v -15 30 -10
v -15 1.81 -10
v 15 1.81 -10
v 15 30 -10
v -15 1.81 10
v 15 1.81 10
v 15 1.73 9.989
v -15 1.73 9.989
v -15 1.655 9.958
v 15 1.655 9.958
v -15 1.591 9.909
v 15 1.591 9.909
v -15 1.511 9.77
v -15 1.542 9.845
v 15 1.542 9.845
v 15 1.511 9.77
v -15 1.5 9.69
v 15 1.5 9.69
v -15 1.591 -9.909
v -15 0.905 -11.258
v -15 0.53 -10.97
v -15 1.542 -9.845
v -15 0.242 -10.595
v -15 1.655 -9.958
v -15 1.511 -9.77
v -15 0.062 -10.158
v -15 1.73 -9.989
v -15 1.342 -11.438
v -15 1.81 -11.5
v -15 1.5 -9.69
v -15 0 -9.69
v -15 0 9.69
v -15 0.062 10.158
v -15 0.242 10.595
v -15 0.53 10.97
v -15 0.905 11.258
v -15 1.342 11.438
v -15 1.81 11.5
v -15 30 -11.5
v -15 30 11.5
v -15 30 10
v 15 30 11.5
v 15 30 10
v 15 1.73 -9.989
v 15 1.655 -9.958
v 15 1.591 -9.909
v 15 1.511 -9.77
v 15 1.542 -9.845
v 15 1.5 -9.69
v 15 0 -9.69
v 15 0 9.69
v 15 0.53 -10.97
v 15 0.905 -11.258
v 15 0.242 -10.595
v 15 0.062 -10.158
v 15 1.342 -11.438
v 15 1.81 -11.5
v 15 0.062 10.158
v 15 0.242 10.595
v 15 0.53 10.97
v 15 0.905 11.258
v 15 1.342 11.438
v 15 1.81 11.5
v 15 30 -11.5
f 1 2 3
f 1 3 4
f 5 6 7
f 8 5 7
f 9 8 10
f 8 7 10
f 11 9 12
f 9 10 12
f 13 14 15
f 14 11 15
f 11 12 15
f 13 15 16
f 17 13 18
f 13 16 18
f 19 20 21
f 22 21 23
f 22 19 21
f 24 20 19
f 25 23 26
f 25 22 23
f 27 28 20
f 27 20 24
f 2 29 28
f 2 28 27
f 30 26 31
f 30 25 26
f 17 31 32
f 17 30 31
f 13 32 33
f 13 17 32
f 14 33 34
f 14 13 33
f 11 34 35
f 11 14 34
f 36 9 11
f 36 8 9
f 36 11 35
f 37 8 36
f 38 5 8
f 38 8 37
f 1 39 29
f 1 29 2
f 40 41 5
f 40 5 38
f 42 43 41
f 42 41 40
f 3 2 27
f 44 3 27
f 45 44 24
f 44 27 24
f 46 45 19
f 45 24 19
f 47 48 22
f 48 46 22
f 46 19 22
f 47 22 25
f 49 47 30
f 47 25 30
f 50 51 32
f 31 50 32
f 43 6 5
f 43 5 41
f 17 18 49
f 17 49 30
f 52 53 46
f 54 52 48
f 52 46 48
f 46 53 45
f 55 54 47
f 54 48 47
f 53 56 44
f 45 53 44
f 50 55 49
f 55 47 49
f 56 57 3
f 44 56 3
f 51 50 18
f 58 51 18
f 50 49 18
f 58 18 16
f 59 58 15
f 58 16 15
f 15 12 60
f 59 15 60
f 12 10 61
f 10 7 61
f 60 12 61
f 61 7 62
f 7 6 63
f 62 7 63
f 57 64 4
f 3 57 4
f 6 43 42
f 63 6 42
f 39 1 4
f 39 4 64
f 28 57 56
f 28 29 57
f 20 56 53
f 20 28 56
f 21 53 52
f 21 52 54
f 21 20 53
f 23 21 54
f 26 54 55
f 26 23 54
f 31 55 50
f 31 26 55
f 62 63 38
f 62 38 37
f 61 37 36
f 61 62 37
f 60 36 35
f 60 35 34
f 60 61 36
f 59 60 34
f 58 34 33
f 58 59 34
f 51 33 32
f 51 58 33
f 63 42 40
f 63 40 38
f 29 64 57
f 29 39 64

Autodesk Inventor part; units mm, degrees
ref_plane "YZ Plane" through (0, 0, 0) normal (1, 0, 0) x (0, 1, 0)
ref_plane "XZ Plane" through (0, 0, 0) normal (0, 1, 0) x (-1, 0, 0)
ref_plane "XY Plane" through (0, 0, 0) normal (0, 0, 1) x (1, 0, 0)
sketch "Sketch1" plane through (0, 0, 0) normal (0, 1, 0) x (-1, 0, 0)
  line L0 (-15, 10) -> (15, 10)
  line L1 (15, 10) -> (15, -10)
  line L2 (15, -10) -> (-15, -10)
  line L3 (-15, -10) -> (-15, 10)
  line L4 (-15, 10) -> (15, -10) construction
  line L5 (15, 10) -> (-15, -10) construction
  point P0 (0, 0)
  dimension "d0" = 20
  dimension "d1" = 30
extrude "Plate1" add sketch "Sketch1" along normal blind 1.5
sketch "Sketch2" plane through (-15, 0, -11.5) normal (0, 0, 1) x (1, 0, 0)
  line L0 (30, 0) -> (0, 0)
  line L1 (0, 0) -> (0, 30)
  line L2 (0, 30) -> (30, 30)
  line L3 (30, 30) -> (30, 0)
edge flange "Flange1" height 30 angle 90 thickness 1.5 bend radius 0.31 thickness toward (0, 0, 1) relief tear relief width 1.5 relief depth 0.75 corner gap 0.31 corner form 0 edges at (0, 1.5, -10) (0, 1.5, 10) wall of the first edge with corners at (15, 0, -11.5) (-15, 0, -11.5) (-15, 30, -11.5) (15, 30, -11.5)
bend "Bend1"
corner "Corner1"
equation "\"d2\" = Thickness"
equation "\"d3\" = BendReliefWidth"
equation "\"d4\" = BendReliefDepth"
equation "\"d5\" = MinimumRemnant"
equation "\"d6\" = TransitionRadius"
equation "\"d9\" = BendRadius"
equation "\"d10\" = CornerReliefSize"
equation "\"d11\" = GapSize"
equation "\"d12\" = JacobiRadiusSize"
equation "\"BendReliefWidth\" = Thickness"
equation "\"BendReliefDepth\" = 0.5 * Thickness"
equation "\"CornerReliefSize\" = 4 * Thickness"
equation "\"MinimumRemnant\" = 2 * Thickness"
equation "\"TransitionRadius\" = BendRadius"
equation "\"JacobiRadiusSize\" = BendRadius"
equation "\"GapSize\" = Thickness"
equation "\"Thickness\" = 1.5"
equation "\"BendRadius\" = 0.31"
properties part number "axis_19_top_frame" material "Aluminum 6061-AHC"
